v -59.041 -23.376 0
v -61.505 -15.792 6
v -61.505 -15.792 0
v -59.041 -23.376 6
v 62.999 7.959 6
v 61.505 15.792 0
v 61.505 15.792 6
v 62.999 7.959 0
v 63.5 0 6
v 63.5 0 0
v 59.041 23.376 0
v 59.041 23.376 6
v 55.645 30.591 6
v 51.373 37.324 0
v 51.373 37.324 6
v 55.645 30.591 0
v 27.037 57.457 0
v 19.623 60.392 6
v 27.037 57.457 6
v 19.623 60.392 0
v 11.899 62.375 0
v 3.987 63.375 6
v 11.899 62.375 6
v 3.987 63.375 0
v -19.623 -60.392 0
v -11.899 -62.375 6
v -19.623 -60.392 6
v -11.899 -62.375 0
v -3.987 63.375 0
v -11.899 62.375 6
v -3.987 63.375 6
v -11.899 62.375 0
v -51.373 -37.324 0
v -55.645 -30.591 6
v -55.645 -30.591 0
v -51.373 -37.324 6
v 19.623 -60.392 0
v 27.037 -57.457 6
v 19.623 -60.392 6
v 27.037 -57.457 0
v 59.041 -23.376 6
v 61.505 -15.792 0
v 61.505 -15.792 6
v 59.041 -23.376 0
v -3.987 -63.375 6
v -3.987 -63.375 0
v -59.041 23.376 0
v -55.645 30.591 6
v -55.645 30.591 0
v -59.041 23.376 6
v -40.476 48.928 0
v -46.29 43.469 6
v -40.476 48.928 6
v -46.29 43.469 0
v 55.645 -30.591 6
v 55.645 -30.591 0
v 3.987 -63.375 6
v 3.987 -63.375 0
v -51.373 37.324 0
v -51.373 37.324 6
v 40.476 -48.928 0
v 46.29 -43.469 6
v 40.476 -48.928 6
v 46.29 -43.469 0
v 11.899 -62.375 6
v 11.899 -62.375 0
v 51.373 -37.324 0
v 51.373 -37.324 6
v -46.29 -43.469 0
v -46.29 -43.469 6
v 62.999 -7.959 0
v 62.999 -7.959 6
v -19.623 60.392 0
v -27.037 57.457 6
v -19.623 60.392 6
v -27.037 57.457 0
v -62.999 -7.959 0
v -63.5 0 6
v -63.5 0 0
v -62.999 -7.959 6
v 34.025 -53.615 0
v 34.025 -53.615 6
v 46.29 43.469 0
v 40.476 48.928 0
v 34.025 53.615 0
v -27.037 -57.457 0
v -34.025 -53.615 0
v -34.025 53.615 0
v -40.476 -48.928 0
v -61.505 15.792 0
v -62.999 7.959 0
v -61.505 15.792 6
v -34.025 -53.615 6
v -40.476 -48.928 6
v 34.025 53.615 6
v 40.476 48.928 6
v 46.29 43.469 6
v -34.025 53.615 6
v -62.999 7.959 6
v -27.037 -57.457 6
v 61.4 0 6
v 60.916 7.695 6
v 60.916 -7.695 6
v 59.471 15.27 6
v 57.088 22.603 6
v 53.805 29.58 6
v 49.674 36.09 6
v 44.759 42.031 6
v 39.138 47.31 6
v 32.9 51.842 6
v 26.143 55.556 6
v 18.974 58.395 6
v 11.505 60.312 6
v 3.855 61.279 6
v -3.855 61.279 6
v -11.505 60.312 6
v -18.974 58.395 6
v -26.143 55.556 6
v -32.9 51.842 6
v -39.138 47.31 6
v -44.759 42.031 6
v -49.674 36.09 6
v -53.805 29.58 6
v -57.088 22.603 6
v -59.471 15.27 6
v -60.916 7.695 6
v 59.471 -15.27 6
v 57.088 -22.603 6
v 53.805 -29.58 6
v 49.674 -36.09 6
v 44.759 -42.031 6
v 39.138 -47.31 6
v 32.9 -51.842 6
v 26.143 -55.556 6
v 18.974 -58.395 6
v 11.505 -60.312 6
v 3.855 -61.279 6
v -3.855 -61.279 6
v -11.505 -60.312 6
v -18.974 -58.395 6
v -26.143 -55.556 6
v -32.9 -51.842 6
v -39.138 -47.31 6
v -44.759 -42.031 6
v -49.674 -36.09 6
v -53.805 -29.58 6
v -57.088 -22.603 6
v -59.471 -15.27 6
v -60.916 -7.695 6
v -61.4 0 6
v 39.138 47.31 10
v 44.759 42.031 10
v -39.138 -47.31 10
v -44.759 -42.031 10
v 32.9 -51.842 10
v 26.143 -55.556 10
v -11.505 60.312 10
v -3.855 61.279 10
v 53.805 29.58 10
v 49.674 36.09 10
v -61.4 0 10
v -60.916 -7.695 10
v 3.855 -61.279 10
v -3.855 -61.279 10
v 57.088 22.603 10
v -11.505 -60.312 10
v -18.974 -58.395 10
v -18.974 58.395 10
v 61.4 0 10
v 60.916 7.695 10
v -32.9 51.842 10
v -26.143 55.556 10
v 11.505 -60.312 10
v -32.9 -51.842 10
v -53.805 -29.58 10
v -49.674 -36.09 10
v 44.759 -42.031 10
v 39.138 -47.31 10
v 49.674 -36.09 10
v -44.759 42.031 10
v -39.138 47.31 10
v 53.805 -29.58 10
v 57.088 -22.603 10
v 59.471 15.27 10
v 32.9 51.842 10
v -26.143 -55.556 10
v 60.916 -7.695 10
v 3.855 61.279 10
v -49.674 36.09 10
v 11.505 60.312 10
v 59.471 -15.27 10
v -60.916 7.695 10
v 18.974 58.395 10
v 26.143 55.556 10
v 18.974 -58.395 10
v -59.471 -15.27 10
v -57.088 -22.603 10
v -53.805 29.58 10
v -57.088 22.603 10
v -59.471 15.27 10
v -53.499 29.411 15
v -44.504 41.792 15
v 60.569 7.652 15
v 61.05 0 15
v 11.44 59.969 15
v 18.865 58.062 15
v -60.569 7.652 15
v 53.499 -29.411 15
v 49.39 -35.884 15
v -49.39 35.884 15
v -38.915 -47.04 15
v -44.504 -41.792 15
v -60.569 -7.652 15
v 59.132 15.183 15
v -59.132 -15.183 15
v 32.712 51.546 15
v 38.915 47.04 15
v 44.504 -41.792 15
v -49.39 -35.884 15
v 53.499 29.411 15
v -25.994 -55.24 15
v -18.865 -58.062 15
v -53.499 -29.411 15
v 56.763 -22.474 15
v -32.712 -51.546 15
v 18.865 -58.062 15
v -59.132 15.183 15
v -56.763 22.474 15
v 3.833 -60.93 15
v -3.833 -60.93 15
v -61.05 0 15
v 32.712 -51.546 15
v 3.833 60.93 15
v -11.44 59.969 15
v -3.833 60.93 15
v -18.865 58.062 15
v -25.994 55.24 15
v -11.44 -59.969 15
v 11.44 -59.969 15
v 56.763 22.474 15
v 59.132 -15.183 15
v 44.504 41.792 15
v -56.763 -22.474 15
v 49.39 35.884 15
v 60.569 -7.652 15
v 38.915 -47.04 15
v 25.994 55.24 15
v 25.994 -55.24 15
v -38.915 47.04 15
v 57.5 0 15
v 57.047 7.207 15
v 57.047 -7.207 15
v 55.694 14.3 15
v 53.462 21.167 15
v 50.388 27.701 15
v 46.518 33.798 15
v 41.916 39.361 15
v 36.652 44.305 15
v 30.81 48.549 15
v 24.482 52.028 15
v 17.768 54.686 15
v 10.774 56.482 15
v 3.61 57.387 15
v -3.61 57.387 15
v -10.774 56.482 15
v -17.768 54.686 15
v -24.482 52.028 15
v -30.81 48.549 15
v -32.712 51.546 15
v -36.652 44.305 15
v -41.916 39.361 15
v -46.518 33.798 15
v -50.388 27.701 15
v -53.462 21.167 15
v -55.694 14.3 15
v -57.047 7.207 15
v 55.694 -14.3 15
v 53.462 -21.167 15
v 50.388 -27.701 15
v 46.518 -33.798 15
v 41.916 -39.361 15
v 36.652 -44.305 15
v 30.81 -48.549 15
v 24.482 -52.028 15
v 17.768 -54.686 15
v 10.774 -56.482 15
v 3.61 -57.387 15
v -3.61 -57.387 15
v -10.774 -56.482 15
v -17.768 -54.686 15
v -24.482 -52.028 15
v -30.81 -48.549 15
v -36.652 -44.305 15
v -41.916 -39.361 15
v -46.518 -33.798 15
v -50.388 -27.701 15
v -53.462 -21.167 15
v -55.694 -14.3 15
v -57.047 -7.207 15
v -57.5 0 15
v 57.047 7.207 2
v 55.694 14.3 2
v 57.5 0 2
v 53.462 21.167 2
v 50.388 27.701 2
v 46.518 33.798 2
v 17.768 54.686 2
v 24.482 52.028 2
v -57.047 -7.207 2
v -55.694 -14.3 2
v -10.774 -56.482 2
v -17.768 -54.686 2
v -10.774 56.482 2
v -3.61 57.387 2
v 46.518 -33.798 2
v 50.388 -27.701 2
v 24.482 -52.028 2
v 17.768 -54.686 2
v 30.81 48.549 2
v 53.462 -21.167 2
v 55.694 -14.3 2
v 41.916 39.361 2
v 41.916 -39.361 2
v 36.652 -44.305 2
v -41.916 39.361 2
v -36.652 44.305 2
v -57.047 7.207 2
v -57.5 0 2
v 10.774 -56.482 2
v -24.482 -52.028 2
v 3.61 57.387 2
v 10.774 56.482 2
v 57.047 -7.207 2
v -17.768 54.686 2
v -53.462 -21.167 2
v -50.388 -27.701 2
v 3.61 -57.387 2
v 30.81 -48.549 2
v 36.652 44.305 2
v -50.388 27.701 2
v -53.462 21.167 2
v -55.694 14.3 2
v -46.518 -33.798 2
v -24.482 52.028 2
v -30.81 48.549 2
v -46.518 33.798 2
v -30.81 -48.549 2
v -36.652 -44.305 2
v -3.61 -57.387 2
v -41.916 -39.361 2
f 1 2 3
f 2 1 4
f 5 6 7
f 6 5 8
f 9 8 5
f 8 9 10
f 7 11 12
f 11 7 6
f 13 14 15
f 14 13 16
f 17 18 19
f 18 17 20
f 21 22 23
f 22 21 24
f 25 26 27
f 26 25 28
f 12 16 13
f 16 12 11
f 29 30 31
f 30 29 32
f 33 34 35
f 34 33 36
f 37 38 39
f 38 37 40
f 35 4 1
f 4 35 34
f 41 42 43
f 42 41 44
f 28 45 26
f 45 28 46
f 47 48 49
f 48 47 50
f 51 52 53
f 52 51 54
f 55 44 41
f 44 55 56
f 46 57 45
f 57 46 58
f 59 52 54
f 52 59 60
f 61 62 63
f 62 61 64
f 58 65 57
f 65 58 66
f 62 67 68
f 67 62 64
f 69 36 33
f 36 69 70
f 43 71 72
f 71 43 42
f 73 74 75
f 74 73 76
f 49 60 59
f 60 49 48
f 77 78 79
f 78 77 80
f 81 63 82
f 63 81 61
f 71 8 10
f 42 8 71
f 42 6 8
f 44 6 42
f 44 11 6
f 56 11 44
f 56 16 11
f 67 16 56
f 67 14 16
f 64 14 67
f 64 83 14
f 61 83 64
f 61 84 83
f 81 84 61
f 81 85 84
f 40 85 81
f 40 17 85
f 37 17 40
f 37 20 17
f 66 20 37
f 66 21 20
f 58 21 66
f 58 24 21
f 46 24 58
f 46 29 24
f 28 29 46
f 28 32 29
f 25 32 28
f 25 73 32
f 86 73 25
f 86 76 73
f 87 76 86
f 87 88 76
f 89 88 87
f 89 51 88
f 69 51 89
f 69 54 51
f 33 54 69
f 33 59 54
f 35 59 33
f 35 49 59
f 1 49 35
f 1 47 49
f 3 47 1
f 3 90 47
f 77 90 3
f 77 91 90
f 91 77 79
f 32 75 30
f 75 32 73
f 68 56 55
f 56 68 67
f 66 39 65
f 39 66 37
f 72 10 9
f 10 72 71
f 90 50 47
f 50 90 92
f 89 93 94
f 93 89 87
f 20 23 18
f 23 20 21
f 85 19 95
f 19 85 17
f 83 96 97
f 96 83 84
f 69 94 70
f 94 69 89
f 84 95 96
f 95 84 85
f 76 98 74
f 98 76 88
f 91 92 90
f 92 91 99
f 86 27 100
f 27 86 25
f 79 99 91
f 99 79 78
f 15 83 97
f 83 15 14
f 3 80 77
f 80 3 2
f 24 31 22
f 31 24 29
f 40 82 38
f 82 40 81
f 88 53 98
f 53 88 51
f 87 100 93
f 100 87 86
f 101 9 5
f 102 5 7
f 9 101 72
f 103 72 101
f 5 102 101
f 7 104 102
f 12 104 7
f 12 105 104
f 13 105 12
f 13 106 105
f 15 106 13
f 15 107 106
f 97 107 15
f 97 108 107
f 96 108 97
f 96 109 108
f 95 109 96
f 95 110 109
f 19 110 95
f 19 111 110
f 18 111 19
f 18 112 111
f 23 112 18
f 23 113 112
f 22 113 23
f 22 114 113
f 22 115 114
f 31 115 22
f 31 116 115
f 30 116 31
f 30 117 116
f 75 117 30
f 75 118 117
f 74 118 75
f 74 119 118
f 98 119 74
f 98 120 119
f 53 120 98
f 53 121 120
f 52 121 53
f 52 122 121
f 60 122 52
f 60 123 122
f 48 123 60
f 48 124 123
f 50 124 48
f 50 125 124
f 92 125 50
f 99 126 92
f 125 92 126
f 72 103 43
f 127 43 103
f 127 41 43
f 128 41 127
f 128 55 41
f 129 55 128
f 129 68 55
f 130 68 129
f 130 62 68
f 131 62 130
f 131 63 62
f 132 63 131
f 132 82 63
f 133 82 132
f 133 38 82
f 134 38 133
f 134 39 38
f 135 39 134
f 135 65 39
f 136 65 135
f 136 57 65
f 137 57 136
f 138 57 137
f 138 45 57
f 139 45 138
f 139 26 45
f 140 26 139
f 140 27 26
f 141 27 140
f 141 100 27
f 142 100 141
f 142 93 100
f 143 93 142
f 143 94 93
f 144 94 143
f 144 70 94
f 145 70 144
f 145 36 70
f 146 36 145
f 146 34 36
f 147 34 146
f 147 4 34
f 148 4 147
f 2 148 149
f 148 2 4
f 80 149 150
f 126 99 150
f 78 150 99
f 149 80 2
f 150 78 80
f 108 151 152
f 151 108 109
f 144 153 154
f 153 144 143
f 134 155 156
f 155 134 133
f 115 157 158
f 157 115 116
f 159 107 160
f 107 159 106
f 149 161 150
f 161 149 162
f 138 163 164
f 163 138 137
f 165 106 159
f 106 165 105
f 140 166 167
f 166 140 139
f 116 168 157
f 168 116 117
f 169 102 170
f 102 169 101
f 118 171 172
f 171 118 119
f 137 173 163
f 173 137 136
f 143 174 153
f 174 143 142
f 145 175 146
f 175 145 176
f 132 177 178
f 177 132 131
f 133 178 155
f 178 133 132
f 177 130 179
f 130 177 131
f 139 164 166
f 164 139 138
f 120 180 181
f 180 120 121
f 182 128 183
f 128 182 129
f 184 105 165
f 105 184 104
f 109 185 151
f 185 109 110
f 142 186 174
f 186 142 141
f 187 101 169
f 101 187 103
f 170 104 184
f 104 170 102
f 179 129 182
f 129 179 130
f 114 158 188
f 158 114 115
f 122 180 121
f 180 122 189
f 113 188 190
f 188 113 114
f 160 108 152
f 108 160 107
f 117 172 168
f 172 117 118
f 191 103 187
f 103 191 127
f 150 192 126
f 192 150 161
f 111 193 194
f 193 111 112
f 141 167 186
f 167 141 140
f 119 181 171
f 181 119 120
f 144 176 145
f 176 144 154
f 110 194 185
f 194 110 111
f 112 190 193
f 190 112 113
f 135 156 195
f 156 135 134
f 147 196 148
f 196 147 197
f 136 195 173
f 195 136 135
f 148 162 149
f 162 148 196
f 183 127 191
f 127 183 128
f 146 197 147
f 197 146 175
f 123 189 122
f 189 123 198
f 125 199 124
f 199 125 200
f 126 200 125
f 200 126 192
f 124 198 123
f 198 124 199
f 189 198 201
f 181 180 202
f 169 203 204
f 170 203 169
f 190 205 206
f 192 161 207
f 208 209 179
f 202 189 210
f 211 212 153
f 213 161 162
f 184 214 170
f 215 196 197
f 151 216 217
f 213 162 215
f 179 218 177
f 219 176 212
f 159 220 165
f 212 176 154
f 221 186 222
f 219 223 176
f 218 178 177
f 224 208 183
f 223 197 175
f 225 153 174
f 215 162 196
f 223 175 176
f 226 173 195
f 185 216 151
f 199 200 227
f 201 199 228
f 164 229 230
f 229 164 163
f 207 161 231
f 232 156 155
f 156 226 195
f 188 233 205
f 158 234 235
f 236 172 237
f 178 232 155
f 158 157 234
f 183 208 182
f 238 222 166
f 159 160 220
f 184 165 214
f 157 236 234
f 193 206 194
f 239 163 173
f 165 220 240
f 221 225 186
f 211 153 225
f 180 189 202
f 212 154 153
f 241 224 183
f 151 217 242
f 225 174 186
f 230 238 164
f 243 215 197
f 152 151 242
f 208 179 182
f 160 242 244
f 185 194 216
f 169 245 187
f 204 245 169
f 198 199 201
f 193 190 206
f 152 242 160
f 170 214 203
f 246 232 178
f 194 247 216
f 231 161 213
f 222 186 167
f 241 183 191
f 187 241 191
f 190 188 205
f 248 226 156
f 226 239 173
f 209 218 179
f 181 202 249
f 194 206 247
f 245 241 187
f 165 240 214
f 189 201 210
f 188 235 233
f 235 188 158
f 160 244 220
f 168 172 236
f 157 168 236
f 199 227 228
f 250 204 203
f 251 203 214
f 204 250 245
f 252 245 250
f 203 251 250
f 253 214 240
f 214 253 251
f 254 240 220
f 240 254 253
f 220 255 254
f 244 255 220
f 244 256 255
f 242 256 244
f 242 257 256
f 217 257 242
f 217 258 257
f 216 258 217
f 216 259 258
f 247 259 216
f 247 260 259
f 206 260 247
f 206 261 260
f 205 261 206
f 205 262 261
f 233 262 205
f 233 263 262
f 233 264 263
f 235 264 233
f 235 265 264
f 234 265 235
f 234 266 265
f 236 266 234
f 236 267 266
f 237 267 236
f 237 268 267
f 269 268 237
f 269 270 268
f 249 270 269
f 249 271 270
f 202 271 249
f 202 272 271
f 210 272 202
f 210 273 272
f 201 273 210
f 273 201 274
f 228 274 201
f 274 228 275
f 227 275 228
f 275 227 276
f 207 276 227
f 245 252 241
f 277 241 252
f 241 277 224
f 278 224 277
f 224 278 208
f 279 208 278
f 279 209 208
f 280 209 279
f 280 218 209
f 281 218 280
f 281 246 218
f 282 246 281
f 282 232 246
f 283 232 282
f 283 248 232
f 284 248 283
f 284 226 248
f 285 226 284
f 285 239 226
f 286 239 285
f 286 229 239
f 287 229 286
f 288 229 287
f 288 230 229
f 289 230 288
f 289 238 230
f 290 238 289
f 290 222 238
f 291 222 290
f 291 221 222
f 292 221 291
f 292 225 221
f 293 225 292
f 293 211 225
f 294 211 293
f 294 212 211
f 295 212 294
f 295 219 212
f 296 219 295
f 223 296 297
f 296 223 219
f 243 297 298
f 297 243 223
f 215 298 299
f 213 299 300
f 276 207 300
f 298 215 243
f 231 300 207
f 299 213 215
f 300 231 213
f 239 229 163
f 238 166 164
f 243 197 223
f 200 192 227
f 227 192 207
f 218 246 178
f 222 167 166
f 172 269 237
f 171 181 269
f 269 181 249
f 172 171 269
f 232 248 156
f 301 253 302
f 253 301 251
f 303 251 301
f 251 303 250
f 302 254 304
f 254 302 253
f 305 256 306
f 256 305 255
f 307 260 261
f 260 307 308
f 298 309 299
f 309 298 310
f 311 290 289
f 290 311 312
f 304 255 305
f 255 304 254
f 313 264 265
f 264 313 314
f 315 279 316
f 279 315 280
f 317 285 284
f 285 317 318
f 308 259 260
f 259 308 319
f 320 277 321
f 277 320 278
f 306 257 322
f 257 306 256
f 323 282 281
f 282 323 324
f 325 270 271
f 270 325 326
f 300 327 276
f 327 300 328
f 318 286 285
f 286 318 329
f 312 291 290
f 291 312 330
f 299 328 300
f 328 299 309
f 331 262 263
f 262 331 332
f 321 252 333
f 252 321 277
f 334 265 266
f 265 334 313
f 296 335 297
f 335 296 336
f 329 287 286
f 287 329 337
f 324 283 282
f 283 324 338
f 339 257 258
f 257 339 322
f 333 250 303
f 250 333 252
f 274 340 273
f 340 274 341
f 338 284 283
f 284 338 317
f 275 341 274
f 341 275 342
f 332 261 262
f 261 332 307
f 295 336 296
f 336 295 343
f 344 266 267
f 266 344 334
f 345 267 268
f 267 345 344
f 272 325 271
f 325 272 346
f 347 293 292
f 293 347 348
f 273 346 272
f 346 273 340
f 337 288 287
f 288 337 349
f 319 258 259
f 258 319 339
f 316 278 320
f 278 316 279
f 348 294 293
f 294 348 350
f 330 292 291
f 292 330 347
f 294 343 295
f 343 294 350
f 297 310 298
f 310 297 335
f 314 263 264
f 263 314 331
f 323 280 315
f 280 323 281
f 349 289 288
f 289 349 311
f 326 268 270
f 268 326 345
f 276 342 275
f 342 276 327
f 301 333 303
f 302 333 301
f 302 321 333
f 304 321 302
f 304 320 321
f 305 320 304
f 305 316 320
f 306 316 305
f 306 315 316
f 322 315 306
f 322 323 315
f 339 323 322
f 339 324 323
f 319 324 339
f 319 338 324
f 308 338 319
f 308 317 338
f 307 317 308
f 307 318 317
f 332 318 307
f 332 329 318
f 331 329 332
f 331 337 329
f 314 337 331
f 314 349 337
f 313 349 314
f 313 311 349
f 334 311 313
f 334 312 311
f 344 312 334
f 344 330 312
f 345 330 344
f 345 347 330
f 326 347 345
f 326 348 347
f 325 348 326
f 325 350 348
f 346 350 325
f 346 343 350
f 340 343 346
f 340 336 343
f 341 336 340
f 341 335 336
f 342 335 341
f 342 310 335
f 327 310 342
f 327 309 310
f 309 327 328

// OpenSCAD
$fn=50;
ht=156;
hb=5;
diam=123;
wall=2;

module box() {
difference() {
    union() {
        cylinder(ht,d=diam+2);
        cylinder(hb,d=diam+5);
        #translate([0,0,ht-hb]) cylinder(hb,d=diam+5);
    }
    translate([0,0,2]) cylinder(ht,d=diam);
    translate([0,0,0]) cylinder(ht,d=5);
}
}

module lid() {
    difference() {
        union() {
            cylinder(6,d=diam+4);
            #cylinder(10,d=diam-.2);
        }
        translate([0,0,2]) cylinder(ht,d=diam-2);

    }
}

module lid2() {
    difference() {
        union() {
            cylinder(6,d=diam+4);
            cylinder(10,d=diam-.2);
            translate([0,0,10]) #cylinder(5,d1=diam-.2,d2=diam-.9);
        }
        translate([0,0,2]) cylinder(ht,d=diam-8);

    }
}



// translate([0,0,165]) rotate([180,0,0]) box();
lid2();
